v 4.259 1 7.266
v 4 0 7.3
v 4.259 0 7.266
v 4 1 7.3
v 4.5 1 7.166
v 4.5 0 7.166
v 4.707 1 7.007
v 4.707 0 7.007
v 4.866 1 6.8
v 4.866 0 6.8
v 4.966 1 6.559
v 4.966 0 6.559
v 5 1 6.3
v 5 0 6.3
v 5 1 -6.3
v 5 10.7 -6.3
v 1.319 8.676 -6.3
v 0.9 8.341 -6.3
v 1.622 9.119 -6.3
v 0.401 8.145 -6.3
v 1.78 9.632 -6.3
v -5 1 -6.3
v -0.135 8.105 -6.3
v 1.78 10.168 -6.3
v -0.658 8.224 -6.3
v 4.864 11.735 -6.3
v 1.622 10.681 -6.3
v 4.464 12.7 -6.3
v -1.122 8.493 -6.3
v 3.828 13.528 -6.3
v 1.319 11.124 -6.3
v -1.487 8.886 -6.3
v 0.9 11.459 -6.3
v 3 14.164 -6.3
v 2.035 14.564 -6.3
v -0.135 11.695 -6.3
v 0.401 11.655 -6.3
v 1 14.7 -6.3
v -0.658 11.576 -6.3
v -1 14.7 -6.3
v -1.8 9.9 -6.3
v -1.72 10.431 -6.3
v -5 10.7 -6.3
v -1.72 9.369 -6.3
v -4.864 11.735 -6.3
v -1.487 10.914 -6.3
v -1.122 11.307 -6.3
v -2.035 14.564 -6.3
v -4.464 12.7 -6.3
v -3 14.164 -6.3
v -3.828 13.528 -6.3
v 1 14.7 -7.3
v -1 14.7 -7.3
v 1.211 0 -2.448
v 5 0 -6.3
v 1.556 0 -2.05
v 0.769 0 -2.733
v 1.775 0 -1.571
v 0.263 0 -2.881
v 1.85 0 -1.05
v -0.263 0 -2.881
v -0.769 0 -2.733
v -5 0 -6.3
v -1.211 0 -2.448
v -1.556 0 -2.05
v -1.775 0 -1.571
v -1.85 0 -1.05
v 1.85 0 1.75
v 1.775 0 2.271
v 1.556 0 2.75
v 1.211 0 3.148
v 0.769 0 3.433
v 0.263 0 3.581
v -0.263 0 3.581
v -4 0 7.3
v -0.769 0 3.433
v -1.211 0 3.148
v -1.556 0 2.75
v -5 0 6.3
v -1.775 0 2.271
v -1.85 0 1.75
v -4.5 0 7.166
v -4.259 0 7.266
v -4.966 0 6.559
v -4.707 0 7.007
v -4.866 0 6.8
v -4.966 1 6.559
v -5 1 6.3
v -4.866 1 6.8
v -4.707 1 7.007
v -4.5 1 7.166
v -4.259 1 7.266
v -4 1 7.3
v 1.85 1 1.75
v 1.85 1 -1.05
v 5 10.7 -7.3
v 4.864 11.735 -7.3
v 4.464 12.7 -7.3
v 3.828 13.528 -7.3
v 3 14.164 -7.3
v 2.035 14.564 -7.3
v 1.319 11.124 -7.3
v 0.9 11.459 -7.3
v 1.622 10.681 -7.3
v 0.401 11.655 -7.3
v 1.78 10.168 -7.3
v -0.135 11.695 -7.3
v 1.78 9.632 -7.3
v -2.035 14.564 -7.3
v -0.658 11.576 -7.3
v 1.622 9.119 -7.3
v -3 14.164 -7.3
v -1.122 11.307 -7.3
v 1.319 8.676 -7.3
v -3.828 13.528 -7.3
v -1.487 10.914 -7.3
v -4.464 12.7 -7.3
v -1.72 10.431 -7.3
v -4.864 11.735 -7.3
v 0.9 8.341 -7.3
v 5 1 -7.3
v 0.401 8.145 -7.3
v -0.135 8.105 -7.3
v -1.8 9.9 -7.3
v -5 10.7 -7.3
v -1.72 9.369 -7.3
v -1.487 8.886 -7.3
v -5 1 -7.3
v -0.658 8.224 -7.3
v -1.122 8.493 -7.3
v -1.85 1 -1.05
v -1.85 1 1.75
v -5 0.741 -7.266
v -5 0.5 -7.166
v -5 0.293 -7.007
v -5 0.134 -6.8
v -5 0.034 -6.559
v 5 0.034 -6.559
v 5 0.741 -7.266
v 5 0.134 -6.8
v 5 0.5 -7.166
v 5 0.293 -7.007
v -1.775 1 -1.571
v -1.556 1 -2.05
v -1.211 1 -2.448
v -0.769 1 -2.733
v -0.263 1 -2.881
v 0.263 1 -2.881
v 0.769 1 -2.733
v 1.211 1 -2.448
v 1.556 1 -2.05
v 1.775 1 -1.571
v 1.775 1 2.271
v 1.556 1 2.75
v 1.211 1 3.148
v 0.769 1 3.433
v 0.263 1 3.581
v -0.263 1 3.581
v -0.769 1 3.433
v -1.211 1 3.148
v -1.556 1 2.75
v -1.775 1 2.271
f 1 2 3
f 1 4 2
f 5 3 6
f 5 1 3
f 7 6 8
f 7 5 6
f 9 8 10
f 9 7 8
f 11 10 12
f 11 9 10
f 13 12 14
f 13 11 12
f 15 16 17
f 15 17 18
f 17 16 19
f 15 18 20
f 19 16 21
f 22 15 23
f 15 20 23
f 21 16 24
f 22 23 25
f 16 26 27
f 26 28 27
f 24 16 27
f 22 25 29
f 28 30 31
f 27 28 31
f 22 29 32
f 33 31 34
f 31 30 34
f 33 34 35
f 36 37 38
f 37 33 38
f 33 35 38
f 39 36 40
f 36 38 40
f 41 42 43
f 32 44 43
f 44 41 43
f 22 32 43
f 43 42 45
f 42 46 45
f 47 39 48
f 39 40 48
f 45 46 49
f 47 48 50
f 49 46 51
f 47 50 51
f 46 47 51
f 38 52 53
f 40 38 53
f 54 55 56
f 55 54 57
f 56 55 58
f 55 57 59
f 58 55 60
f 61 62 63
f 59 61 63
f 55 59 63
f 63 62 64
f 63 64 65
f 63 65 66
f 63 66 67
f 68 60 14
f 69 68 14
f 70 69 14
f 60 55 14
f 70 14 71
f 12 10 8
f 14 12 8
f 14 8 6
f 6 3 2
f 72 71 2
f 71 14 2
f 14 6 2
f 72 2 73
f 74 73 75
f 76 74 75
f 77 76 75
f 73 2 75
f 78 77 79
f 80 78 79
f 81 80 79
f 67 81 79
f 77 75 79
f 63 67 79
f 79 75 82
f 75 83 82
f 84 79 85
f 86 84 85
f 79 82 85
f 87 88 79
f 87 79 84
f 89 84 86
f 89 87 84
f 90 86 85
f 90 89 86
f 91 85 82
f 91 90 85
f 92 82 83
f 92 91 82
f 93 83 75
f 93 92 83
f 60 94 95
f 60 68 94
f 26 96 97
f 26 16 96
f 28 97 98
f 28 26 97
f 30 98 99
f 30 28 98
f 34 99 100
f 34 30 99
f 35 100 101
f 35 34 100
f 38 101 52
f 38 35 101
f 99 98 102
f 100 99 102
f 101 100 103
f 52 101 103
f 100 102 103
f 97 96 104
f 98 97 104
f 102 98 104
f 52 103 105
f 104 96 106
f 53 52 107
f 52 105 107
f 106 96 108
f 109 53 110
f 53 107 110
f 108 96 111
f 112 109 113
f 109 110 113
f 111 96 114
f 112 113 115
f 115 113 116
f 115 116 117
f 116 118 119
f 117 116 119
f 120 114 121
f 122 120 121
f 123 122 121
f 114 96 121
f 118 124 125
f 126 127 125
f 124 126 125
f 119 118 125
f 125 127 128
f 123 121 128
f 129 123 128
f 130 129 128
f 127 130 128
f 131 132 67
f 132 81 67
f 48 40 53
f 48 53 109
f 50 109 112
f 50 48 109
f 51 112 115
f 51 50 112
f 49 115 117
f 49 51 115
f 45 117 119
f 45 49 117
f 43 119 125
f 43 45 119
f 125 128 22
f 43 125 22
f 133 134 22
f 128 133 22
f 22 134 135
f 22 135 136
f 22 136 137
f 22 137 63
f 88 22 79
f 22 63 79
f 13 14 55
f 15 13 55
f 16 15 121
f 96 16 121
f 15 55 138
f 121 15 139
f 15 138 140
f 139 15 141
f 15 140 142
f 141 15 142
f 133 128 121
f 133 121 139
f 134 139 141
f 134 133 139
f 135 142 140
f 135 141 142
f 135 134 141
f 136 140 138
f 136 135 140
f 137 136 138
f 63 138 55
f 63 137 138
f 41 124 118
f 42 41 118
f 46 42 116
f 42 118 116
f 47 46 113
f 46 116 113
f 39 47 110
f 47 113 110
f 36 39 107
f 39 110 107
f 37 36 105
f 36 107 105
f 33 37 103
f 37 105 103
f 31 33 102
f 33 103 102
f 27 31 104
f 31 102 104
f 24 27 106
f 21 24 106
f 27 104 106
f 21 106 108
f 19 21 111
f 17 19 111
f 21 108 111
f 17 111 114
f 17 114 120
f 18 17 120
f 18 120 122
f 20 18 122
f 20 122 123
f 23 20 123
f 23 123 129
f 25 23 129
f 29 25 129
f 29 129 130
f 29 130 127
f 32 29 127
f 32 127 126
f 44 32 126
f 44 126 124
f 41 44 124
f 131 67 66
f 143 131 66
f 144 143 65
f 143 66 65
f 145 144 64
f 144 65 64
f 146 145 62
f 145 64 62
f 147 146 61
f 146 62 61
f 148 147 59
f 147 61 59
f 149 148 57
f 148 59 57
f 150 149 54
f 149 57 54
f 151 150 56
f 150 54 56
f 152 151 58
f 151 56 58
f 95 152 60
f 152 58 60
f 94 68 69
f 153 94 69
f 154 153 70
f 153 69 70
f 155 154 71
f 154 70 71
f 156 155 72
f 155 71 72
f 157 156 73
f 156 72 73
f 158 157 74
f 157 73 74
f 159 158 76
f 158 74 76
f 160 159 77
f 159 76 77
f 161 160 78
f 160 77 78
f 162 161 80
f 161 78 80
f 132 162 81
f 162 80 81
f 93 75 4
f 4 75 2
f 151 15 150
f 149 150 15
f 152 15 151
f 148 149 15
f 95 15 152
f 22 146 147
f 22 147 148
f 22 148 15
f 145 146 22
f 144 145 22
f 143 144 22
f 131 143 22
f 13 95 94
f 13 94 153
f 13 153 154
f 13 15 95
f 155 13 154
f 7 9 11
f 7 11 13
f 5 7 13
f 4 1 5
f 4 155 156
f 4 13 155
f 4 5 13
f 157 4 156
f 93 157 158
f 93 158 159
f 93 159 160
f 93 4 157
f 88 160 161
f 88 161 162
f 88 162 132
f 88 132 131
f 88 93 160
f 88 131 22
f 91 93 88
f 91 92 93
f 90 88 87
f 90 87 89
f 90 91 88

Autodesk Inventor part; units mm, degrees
ref_plane "YZ Plane" through (0, 0, 0) normal (1, 0, 0) x (0, 1, 0)
ref_plane "XZ Plane" through (0, 0, 0) normal (0, 1, 0) x (-1, 0, 0)
ref_plane "XY Plane" through (0, 0, 0) normal (0, 0, 1) x (1, 0, 0)
sketch "Sketch1" plane through (0, 0, 0) normal (0, 1, 0) x (-1, 0, 0)
  line L0 (5, 7.3) -> (-5, 7.3)
  line L1 (-5, 7.3) -> (-5, -7.3)
  line L2 (-5, -7.3) -> (5, -7.3)
  line L3 (5, -7.3) -> (5, 7.3)
  line L4 (5, 7.3) -> (-5, -7.3) construction
  line L5 (-5, 7.3) -> (5, -7.3) construction
  point P0 (0, 0)
  dimension "d0" = 10
  dimension "d1" = 14.6
extrude "Extrusion1" add sketch "Sketch1" along normal blind 1
sketch "Sketch2" plane through (5, 0, -7.3) normal (0, 0, -1) x (-1, 0, 0)
  line L0 (0, 0) -> (10, 0) projected
  line L1 (0, 0) -> (0, 14.7)
  line L2 (0, 14.7) -> (10, 14.7)
  line L3 (10, 14.7) -> (10, 0)
  point P0 (5, 0)
  dimension "d4" = 14.7
extrude "Extrusion2" add sketch "Sketch2" against normal blind 1
fillet "Fillet1" radius 4 2 edges at (5, 14.7, -6.8) (-5, 14.7, -6.8)
fillet "Fillet2" radius 1 2 edges at (-5, 0.5, 7.3) (5, 0.5, 7.3)
fillet "Fillet3" radius 1 1 edges at (0, 0, -7.3)
sketch "Sketch3" plane through (1, 14.7, -7.3) normal (0, 0, -1) x (-1, 0, 0)
  circle A0 centre (1, -4.8) radius 1.8
  line L0 (-4, -13.7) -> (-4, -4) projected
  line L1 (1, -3) -> (2.7418, -3) construction
  line L2 (2, 0) -> (0, 0) construction
  point P0 (1, -14.7)
  dimension "d12" = 3.6
  dimension "d10" = 5
  dimension "d11" = 3
extrude "Extrusion3" cut sketch "Sketch3" against normal blind 1
sketch "Sketch4" plane through (0, 0, 0) normal (0, -1, 0) x (1, 0, 0)
  line L0 (5, 6.3) -> (5, -6.3) projected
  line L1 (0, 3.6) -> (1.5693, 3.6) construction
  line L2 (-4, 7.3) -> (4, 7.3) projected
  line L3 (0, -2.9) -> (1.85, -2.9) construction
  line L4 (1.85, 1.75) -> (1.85, -1.05)
  line L5 (-1.85, 1.75) -> (-1.85, -1.05)
  arc A0 (1.85, 1.75) -> (-1.85, 1.75) centre (0, 1.75) ccw
  arc A1 (-1.85, -1.05) -> (1.85, -1.05) centre (0, -1.05) ccw
  line L6 (-5, -6.3) -> (-5, 6.3) projected
  point P0 (0, 0)
  dimension "d16" = 5
  dimension "d17" = 3.7
  dimension "d19" = 6.5
  dimension "d20" = 3.15
  dimension "d21" = 3.15
extrude "Extrusion4" cut sketch "Sketch4" against normal blind 1
properties part number "angle bracket short"
